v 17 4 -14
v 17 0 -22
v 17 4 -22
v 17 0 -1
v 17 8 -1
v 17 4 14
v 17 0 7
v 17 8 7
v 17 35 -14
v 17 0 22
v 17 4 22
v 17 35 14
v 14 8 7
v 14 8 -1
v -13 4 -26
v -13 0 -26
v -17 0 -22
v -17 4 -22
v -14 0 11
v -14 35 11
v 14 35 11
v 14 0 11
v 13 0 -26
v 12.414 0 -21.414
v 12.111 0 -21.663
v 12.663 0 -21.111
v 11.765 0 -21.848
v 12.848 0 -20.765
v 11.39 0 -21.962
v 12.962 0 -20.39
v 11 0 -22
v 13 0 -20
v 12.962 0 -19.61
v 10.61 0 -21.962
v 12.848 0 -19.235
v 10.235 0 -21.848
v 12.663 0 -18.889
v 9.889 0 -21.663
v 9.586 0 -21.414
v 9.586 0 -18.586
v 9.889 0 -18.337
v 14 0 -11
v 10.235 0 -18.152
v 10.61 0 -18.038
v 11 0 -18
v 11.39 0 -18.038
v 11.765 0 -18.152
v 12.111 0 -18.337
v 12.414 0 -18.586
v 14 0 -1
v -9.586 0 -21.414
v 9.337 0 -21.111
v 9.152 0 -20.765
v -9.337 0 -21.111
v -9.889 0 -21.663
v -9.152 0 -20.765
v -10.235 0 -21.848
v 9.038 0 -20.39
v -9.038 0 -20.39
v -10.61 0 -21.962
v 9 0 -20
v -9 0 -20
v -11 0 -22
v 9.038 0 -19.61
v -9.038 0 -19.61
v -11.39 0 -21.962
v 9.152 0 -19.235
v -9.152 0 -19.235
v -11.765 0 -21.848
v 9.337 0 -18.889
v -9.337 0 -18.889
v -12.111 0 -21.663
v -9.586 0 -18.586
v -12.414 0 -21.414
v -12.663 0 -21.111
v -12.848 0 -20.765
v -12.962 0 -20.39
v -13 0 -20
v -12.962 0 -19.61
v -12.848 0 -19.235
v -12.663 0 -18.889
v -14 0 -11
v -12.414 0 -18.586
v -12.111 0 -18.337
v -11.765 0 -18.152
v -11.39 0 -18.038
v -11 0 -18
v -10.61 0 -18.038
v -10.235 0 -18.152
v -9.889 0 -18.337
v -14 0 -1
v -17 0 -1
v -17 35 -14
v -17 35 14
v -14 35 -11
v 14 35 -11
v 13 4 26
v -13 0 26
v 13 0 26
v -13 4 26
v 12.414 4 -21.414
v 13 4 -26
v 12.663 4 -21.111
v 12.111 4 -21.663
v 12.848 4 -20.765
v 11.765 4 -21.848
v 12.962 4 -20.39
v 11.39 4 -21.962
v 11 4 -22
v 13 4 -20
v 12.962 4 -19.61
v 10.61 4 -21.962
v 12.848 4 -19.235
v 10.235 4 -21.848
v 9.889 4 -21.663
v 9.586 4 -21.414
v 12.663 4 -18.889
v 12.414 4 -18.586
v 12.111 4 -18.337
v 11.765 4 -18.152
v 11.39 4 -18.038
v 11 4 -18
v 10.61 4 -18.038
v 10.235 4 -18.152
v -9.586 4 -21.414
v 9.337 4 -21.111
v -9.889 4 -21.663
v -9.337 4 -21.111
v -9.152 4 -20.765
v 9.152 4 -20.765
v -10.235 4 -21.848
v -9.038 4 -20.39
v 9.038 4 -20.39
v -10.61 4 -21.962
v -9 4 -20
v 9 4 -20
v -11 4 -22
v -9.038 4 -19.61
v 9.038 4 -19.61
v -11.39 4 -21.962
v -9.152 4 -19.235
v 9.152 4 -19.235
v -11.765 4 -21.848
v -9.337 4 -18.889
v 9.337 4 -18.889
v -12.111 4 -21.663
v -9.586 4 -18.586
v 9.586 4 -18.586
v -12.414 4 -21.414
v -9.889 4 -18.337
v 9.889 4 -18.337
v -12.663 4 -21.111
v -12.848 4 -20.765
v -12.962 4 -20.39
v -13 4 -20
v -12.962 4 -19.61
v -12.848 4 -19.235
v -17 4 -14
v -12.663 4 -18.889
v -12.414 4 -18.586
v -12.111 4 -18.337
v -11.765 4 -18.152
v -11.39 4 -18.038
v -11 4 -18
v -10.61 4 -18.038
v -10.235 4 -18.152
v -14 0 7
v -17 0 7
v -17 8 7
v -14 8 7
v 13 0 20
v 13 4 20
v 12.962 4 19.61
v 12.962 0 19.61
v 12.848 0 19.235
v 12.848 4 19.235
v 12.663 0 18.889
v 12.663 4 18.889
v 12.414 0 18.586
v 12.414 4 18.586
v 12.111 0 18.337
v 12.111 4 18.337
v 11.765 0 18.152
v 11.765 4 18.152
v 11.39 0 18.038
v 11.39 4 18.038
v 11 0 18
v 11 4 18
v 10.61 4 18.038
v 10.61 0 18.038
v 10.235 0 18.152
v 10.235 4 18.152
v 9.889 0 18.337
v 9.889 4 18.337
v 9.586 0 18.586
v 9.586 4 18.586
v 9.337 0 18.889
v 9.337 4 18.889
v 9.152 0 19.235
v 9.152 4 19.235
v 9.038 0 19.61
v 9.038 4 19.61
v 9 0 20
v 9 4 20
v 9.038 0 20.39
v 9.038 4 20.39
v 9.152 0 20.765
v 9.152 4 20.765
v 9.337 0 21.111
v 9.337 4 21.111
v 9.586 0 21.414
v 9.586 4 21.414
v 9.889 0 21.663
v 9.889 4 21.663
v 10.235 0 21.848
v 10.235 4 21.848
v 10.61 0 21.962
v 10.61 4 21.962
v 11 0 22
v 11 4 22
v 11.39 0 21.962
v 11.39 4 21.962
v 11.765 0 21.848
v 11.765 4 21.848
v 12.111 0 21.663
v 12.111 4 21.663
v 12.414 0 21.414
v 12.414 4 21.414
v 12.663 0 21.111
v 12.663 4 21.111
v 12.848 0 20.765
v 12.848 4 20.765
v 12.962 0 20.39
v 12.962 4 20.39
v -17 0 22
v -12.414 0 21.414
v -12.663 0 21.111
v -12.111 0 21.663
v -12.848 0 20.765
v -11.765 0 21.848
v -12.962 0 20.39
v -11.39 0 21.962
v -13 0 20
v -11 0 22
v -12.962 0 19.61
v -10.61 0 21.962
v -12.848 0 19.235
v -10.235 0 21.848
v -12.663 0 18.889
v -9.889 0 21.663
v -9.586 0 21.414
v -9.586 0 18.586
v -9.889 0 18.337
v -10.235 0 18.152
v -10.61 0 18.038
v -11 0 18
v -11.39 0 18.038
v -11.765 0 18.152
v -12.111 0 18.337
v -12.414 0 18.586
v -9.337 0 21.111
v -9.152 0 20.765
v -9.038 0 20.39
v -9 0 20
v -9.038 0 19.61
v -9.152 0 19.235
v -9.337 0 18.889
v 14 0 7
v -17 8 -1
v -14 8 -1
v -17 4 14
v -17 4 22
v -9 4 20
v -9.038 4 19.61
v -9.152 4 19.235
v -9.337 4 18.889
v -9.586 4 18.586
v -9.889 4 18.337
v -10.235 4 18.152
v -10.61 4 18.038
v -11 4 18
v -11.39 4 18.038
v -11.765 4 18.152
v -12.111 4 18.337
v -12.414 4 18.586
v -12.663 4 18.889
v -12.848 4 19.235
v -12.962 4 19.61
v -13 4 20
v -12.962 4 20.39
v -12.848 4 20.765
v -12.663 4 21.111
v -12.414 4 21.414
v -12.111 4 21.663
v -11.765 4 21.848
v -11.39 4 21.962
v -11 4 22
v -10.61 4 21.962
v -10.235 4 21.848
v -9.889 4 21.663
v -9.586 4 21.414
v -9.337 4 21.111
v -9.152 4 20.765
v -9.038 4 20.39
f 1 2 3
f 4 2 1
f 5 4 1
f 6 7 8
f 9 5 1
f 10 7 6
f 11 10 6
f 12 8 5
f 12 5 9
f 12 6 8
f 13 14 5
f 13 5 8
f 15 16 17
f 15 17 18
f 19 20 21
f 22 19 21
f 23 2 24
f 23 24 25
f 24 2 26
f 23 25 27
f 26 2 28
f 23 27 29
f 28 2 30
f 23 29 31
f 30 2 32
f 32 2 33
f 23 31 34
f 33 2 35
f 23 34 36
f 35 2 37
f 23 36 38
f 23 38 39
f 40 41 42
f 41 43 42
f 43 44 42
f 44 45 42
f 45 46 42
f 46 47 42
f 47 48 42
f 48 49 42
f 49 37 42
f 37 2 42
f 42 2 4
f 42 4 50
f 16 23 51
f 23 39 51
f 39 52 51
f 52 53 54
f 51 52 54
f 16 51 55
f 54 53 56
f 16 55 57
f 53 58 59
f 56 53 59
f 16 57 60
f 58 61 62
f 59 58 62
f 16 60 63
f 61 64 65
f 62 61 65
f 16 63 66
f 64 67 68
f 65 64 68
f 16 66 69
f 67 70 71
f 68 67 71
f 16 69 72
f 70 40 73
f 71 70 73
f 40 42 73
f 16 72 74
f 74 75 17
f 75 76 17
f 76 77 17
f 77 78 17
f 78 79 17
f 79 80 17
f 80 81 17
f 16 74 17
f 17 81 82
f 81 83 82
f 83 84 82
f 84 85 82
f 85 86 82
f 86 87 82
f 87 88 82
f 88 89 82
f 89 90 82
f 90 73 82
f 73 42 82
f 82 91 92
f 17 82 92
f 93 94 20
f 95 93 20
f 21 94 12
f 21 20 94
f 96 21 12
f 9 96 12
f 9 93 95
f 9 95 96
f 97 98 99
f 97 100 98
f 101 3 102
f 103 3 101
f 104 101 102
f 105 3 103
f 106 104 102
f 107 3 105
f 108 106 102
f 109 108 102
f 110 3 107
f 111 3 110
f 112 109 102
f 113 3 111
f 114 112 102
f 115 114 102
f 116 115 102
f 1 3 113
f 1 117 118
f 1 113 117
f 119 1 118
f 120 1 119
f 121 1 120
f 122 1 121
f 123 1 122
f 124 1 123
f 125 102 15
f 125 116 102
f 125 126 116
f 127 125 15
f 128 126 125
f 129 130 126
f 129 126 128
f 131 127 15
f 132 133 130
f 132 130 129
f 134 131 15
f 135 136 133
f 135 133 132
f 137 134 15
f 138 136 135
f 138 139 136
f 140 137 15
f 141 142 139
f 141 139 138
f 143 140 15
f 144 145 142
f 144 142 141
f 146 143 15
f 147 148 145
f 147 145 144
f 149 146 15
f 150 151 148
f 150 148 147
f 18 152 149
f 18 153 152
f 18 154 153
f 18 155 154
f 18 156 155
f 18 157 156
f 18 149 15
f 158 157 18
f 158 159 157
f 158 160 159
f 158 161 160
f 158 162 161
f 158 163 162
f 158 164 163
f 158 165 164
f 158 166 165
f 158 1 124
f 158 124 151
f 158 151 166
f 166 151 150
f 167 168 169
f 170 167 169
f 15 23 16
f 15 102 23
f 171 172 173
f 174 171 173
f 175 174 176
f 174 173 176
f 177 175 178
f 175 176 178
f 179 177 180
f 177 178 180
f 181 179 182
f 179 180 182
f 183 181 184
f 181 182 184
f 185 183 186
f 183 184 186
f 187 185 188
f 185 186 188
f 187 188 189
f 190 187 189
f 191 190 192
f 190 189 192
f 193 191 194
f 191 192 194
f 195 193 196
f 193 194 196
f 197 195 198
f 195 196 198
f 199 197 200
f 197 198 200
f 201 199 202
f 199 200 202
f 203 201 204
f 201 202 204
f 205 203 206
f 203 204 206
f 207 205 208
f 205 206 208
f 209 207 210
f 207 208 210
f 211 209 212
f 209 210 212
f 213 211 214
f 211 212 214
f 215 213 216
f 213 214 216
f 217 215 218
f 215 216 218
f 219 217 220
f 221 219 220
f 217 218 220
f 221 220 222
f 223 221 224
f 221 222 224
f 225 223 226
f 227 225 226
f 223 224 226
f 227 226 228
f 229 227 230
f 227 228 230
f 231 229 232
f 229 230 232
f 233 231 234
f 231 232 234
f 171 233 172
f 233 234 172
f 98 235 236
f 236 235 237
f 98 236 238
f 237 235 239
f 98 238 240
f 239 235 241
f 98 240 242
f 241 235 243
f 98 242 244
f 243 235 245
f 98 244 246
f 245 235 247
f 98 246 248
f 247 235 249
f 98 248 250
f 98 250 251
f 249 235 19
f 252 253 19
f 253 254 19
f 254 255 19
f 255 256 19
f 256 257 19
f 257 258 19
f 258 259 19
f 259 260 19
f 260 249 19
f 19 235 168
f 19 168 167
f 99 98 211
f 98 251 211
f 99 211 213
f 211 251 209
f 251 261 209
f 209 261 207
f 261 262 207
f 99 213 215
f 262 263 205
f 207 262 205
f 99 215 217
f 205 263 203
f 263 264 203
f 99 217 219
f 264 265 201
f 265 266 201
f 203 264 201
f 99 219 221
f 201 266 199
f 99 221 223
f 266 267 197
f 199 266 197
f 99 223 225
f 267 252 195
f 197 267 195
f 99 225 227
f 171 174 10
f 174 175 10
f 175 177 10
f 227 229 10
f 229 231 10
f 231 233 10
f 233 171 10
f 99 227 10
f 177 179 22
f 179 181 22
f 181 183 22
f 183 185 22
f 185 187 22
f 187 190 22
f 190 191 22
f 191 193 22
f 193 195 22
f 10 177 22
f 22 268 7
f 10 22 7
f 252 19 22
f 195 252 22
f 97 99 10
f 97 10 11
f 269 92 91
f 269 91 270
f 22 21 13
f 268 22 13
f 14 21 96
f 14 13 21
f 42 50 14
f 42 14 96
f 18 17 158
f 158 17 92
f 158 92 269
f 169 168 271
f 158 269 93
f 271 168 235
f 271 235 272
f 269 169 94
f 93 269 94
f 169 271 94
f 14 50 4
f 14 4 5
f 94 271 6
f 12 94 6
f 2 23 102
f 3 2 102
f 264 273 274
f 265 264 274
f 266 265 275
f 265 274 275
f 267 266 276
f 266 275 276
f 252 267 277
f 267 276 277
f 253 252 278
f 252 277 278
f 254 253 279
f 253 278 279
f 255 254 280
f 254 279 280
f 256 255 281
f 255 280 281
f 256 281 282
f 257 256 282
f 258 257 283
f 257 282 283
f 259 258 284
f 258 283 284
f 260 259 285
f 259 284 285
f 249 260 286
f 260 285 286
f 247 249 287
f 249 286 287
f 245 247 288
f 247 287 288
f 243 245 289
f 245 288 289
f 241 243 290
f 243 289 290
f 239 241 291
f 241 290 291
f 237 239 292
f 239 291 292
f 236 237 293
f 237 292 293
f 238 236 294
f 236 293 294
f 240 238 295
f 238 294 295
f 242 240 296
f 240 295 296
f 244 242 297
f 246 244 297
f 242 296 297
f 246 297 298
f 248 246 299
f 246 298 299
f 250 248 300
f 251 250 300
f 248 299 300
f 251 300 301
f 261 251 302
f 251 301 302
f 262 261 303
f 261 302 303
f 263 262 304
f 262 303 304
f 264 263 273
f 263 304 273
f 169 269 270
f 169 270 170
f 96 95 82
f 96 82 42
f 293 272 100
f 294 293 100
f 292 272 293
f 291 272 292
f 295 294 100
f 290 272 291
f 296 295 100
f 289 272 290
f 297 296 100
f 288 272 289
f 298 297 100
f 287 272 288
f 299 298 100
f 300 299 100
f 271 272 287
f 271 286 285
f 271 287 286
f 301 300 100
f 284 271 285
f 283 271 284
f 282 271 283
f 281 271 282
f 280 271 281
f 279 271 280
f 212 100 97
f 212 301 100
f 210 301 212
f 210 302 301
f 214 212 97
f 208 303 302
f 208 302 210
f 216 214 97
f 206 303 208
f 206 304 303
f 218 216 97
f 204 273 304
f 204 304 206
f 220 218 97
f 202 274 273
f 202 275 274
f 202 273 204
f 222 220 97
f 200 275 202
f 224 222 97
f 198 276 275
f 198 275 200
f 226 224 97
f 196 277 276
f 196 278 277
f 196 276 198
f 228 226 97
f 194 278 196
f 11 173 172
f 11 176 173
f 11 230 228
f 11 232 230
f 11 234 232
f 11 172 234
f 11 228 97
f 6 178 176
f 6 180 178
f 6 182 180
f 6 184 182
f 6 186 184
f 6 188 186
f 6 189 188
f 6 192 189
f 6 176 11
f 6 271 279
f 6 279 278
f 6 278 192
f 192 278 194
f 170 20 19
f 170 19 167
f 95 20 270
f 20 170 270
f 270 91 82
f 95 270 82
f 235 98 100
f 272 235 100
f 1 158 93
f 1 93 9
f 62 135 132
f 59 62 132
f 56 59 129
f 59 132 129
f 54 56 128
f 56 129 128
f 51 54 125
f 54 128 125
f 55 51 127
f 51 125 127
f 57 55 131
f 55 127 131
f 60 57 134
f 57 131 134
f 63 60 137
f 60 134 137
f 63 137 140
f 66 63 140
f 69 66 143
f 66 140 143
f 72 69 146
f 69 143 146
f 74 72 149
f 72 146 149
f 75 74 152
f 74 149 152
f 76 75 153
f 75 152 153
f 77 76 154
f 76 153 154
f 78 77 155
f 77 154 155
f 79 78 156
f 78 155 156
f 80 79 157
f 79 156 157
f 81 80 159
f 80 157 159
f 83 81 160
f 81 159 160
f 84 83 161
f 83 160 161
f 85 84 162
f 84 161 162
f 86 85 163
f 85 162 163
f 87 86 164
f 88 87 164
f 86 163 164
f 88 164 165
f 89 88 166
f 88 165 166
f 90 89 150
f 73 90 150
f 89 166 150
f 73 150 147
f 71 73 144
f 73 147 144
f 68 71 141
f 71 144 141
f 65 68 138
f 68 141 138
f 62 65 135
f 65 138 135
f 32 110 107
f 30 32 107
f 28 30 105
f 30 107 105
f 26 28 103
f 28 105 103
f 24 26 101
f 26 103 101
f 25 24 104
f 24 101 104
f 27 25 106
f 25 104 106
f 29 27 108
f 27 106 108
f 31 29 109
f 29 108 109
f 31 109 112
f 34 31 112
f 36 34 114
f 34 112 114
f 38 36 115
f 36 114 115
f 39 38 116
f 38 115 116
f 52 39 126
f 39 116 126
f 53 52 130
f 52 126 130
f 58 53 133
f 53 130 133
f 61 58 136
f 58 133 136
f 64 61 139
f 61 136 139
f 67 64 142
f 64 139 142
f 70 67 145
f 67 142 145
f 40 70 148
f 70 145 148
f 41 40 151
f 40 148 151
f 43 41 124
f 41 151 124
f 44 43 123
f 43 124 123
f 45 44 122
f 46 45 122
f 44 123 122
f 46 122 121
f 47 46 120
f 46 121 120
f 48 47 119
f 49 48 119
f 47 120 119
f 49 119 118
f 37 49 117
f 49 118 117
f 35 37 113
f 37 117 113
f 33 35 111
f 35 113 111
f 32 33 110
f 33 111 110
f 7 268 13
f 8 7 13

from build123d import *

# Parameters (mm, degrees)
SKETCH1_W           = 34
SKETCH1_H           = 28
SKETCH1_W_2         = 28
SKETCH1_H_2         = 22
BOSS_EXTRUDE1_DEPTH = 35
SKETCH2_W           = 8
SKETCH2_H           = 8
CUT_EXTRUDE1_DEPTH  = 35
SKETCH3_W           = 34
SKETCH3_H           = 4
BOSS_EXTRUDE2_DEPTH = 12
SKETCH4_W           = 34
SKETCH4_H           = 4
BOSS_EXTRUDE3_DEPTH = 12
CHAMFER1_SIZE       = 4
SKETCH5_R           = 2
CUT_EXTRUDE2_DEPTH  = 4


with BuildPart() as part:
    # Sketch1 → Boss-Extrude1 (new body)
    with BuildSketch(Plane(origin=(0, 0, 0), x_dir=(1, 0, 0), z_dir=(0, 1, 0))):
        Rectangle(SKETCH1_W, SKETCH1_H)
        Rectangle(SKETCH1_W_2, SKETCH1_H_2, mode=Mode.SUBTRACT)
    extrude(amount=BOSS_EXTRUDE1_DEPTH)

    # Sketch2 → Cut-Extrude1 (cut)
    with BuildSketch(Plane.ZY.offset(17)):
        with Locations((3, 4)):
            Rectangle(SKETCH2_W, SKETCH2_H)
    extrude(amount=-CUT_EXTRUDE1_DEPTH, mode=Mode.SUBTRACT)

    # Sketch3 → Boss-Extrude2 (add)
    with BuildSketch(Plane.XY.offset(14)):
        with Locations((0, 2)):
            Rectangle(SKETCH3_W, SKETCH3_H)
    extrude(amount=BOSS_EXTRUDE2_DEPTH)

    # Sketch4 → Boss-Extrude3 (add)
    with BuildSketch(Plane(origin=(0, 0, -14), x_dir=(-1, 0, 0), z_dir=(0, 0, -1))):
        with Locations((0, 2)):
            Rectangle(SKETCH4_W, SKETCH4_H)
    extrude(amount=BOSS_EXTRUDE3_DEPTH)

    # Chamfer1
    chamfer1_edges = [part.edges().sort_by_distance(p)[0] for p in [
        (-17, 2, 26),
        (17, 2, 26),
        (17, 2, -26),
        (-17, 2, -26),
    ]]
    chamfer(chamfer1_edges, length=CHAMFER1_SIZE)

    # Sketch5 → Cut-Extrude2 (cut)
    with BuildSketch(Plane(origin=(0, 4, 0), x_dir=(1, 0, 0), z_dir=(0, 1, 0))):
        with Locations((-11, -20)):
            Circle(SKETCH5_R)
        with Locations((11, -20)):
            Circle(SKETCH5_R)
        with Locations((-11, 20)):
            Circle(SKETCH5_R)
        with Locations((11, 20)):
            Circle(SKETCH5_R)
    extrude(amount=-CUT_EXTRUDE2_DEPTH, mode=Mode.SUBTRACT)


solid = part.part
